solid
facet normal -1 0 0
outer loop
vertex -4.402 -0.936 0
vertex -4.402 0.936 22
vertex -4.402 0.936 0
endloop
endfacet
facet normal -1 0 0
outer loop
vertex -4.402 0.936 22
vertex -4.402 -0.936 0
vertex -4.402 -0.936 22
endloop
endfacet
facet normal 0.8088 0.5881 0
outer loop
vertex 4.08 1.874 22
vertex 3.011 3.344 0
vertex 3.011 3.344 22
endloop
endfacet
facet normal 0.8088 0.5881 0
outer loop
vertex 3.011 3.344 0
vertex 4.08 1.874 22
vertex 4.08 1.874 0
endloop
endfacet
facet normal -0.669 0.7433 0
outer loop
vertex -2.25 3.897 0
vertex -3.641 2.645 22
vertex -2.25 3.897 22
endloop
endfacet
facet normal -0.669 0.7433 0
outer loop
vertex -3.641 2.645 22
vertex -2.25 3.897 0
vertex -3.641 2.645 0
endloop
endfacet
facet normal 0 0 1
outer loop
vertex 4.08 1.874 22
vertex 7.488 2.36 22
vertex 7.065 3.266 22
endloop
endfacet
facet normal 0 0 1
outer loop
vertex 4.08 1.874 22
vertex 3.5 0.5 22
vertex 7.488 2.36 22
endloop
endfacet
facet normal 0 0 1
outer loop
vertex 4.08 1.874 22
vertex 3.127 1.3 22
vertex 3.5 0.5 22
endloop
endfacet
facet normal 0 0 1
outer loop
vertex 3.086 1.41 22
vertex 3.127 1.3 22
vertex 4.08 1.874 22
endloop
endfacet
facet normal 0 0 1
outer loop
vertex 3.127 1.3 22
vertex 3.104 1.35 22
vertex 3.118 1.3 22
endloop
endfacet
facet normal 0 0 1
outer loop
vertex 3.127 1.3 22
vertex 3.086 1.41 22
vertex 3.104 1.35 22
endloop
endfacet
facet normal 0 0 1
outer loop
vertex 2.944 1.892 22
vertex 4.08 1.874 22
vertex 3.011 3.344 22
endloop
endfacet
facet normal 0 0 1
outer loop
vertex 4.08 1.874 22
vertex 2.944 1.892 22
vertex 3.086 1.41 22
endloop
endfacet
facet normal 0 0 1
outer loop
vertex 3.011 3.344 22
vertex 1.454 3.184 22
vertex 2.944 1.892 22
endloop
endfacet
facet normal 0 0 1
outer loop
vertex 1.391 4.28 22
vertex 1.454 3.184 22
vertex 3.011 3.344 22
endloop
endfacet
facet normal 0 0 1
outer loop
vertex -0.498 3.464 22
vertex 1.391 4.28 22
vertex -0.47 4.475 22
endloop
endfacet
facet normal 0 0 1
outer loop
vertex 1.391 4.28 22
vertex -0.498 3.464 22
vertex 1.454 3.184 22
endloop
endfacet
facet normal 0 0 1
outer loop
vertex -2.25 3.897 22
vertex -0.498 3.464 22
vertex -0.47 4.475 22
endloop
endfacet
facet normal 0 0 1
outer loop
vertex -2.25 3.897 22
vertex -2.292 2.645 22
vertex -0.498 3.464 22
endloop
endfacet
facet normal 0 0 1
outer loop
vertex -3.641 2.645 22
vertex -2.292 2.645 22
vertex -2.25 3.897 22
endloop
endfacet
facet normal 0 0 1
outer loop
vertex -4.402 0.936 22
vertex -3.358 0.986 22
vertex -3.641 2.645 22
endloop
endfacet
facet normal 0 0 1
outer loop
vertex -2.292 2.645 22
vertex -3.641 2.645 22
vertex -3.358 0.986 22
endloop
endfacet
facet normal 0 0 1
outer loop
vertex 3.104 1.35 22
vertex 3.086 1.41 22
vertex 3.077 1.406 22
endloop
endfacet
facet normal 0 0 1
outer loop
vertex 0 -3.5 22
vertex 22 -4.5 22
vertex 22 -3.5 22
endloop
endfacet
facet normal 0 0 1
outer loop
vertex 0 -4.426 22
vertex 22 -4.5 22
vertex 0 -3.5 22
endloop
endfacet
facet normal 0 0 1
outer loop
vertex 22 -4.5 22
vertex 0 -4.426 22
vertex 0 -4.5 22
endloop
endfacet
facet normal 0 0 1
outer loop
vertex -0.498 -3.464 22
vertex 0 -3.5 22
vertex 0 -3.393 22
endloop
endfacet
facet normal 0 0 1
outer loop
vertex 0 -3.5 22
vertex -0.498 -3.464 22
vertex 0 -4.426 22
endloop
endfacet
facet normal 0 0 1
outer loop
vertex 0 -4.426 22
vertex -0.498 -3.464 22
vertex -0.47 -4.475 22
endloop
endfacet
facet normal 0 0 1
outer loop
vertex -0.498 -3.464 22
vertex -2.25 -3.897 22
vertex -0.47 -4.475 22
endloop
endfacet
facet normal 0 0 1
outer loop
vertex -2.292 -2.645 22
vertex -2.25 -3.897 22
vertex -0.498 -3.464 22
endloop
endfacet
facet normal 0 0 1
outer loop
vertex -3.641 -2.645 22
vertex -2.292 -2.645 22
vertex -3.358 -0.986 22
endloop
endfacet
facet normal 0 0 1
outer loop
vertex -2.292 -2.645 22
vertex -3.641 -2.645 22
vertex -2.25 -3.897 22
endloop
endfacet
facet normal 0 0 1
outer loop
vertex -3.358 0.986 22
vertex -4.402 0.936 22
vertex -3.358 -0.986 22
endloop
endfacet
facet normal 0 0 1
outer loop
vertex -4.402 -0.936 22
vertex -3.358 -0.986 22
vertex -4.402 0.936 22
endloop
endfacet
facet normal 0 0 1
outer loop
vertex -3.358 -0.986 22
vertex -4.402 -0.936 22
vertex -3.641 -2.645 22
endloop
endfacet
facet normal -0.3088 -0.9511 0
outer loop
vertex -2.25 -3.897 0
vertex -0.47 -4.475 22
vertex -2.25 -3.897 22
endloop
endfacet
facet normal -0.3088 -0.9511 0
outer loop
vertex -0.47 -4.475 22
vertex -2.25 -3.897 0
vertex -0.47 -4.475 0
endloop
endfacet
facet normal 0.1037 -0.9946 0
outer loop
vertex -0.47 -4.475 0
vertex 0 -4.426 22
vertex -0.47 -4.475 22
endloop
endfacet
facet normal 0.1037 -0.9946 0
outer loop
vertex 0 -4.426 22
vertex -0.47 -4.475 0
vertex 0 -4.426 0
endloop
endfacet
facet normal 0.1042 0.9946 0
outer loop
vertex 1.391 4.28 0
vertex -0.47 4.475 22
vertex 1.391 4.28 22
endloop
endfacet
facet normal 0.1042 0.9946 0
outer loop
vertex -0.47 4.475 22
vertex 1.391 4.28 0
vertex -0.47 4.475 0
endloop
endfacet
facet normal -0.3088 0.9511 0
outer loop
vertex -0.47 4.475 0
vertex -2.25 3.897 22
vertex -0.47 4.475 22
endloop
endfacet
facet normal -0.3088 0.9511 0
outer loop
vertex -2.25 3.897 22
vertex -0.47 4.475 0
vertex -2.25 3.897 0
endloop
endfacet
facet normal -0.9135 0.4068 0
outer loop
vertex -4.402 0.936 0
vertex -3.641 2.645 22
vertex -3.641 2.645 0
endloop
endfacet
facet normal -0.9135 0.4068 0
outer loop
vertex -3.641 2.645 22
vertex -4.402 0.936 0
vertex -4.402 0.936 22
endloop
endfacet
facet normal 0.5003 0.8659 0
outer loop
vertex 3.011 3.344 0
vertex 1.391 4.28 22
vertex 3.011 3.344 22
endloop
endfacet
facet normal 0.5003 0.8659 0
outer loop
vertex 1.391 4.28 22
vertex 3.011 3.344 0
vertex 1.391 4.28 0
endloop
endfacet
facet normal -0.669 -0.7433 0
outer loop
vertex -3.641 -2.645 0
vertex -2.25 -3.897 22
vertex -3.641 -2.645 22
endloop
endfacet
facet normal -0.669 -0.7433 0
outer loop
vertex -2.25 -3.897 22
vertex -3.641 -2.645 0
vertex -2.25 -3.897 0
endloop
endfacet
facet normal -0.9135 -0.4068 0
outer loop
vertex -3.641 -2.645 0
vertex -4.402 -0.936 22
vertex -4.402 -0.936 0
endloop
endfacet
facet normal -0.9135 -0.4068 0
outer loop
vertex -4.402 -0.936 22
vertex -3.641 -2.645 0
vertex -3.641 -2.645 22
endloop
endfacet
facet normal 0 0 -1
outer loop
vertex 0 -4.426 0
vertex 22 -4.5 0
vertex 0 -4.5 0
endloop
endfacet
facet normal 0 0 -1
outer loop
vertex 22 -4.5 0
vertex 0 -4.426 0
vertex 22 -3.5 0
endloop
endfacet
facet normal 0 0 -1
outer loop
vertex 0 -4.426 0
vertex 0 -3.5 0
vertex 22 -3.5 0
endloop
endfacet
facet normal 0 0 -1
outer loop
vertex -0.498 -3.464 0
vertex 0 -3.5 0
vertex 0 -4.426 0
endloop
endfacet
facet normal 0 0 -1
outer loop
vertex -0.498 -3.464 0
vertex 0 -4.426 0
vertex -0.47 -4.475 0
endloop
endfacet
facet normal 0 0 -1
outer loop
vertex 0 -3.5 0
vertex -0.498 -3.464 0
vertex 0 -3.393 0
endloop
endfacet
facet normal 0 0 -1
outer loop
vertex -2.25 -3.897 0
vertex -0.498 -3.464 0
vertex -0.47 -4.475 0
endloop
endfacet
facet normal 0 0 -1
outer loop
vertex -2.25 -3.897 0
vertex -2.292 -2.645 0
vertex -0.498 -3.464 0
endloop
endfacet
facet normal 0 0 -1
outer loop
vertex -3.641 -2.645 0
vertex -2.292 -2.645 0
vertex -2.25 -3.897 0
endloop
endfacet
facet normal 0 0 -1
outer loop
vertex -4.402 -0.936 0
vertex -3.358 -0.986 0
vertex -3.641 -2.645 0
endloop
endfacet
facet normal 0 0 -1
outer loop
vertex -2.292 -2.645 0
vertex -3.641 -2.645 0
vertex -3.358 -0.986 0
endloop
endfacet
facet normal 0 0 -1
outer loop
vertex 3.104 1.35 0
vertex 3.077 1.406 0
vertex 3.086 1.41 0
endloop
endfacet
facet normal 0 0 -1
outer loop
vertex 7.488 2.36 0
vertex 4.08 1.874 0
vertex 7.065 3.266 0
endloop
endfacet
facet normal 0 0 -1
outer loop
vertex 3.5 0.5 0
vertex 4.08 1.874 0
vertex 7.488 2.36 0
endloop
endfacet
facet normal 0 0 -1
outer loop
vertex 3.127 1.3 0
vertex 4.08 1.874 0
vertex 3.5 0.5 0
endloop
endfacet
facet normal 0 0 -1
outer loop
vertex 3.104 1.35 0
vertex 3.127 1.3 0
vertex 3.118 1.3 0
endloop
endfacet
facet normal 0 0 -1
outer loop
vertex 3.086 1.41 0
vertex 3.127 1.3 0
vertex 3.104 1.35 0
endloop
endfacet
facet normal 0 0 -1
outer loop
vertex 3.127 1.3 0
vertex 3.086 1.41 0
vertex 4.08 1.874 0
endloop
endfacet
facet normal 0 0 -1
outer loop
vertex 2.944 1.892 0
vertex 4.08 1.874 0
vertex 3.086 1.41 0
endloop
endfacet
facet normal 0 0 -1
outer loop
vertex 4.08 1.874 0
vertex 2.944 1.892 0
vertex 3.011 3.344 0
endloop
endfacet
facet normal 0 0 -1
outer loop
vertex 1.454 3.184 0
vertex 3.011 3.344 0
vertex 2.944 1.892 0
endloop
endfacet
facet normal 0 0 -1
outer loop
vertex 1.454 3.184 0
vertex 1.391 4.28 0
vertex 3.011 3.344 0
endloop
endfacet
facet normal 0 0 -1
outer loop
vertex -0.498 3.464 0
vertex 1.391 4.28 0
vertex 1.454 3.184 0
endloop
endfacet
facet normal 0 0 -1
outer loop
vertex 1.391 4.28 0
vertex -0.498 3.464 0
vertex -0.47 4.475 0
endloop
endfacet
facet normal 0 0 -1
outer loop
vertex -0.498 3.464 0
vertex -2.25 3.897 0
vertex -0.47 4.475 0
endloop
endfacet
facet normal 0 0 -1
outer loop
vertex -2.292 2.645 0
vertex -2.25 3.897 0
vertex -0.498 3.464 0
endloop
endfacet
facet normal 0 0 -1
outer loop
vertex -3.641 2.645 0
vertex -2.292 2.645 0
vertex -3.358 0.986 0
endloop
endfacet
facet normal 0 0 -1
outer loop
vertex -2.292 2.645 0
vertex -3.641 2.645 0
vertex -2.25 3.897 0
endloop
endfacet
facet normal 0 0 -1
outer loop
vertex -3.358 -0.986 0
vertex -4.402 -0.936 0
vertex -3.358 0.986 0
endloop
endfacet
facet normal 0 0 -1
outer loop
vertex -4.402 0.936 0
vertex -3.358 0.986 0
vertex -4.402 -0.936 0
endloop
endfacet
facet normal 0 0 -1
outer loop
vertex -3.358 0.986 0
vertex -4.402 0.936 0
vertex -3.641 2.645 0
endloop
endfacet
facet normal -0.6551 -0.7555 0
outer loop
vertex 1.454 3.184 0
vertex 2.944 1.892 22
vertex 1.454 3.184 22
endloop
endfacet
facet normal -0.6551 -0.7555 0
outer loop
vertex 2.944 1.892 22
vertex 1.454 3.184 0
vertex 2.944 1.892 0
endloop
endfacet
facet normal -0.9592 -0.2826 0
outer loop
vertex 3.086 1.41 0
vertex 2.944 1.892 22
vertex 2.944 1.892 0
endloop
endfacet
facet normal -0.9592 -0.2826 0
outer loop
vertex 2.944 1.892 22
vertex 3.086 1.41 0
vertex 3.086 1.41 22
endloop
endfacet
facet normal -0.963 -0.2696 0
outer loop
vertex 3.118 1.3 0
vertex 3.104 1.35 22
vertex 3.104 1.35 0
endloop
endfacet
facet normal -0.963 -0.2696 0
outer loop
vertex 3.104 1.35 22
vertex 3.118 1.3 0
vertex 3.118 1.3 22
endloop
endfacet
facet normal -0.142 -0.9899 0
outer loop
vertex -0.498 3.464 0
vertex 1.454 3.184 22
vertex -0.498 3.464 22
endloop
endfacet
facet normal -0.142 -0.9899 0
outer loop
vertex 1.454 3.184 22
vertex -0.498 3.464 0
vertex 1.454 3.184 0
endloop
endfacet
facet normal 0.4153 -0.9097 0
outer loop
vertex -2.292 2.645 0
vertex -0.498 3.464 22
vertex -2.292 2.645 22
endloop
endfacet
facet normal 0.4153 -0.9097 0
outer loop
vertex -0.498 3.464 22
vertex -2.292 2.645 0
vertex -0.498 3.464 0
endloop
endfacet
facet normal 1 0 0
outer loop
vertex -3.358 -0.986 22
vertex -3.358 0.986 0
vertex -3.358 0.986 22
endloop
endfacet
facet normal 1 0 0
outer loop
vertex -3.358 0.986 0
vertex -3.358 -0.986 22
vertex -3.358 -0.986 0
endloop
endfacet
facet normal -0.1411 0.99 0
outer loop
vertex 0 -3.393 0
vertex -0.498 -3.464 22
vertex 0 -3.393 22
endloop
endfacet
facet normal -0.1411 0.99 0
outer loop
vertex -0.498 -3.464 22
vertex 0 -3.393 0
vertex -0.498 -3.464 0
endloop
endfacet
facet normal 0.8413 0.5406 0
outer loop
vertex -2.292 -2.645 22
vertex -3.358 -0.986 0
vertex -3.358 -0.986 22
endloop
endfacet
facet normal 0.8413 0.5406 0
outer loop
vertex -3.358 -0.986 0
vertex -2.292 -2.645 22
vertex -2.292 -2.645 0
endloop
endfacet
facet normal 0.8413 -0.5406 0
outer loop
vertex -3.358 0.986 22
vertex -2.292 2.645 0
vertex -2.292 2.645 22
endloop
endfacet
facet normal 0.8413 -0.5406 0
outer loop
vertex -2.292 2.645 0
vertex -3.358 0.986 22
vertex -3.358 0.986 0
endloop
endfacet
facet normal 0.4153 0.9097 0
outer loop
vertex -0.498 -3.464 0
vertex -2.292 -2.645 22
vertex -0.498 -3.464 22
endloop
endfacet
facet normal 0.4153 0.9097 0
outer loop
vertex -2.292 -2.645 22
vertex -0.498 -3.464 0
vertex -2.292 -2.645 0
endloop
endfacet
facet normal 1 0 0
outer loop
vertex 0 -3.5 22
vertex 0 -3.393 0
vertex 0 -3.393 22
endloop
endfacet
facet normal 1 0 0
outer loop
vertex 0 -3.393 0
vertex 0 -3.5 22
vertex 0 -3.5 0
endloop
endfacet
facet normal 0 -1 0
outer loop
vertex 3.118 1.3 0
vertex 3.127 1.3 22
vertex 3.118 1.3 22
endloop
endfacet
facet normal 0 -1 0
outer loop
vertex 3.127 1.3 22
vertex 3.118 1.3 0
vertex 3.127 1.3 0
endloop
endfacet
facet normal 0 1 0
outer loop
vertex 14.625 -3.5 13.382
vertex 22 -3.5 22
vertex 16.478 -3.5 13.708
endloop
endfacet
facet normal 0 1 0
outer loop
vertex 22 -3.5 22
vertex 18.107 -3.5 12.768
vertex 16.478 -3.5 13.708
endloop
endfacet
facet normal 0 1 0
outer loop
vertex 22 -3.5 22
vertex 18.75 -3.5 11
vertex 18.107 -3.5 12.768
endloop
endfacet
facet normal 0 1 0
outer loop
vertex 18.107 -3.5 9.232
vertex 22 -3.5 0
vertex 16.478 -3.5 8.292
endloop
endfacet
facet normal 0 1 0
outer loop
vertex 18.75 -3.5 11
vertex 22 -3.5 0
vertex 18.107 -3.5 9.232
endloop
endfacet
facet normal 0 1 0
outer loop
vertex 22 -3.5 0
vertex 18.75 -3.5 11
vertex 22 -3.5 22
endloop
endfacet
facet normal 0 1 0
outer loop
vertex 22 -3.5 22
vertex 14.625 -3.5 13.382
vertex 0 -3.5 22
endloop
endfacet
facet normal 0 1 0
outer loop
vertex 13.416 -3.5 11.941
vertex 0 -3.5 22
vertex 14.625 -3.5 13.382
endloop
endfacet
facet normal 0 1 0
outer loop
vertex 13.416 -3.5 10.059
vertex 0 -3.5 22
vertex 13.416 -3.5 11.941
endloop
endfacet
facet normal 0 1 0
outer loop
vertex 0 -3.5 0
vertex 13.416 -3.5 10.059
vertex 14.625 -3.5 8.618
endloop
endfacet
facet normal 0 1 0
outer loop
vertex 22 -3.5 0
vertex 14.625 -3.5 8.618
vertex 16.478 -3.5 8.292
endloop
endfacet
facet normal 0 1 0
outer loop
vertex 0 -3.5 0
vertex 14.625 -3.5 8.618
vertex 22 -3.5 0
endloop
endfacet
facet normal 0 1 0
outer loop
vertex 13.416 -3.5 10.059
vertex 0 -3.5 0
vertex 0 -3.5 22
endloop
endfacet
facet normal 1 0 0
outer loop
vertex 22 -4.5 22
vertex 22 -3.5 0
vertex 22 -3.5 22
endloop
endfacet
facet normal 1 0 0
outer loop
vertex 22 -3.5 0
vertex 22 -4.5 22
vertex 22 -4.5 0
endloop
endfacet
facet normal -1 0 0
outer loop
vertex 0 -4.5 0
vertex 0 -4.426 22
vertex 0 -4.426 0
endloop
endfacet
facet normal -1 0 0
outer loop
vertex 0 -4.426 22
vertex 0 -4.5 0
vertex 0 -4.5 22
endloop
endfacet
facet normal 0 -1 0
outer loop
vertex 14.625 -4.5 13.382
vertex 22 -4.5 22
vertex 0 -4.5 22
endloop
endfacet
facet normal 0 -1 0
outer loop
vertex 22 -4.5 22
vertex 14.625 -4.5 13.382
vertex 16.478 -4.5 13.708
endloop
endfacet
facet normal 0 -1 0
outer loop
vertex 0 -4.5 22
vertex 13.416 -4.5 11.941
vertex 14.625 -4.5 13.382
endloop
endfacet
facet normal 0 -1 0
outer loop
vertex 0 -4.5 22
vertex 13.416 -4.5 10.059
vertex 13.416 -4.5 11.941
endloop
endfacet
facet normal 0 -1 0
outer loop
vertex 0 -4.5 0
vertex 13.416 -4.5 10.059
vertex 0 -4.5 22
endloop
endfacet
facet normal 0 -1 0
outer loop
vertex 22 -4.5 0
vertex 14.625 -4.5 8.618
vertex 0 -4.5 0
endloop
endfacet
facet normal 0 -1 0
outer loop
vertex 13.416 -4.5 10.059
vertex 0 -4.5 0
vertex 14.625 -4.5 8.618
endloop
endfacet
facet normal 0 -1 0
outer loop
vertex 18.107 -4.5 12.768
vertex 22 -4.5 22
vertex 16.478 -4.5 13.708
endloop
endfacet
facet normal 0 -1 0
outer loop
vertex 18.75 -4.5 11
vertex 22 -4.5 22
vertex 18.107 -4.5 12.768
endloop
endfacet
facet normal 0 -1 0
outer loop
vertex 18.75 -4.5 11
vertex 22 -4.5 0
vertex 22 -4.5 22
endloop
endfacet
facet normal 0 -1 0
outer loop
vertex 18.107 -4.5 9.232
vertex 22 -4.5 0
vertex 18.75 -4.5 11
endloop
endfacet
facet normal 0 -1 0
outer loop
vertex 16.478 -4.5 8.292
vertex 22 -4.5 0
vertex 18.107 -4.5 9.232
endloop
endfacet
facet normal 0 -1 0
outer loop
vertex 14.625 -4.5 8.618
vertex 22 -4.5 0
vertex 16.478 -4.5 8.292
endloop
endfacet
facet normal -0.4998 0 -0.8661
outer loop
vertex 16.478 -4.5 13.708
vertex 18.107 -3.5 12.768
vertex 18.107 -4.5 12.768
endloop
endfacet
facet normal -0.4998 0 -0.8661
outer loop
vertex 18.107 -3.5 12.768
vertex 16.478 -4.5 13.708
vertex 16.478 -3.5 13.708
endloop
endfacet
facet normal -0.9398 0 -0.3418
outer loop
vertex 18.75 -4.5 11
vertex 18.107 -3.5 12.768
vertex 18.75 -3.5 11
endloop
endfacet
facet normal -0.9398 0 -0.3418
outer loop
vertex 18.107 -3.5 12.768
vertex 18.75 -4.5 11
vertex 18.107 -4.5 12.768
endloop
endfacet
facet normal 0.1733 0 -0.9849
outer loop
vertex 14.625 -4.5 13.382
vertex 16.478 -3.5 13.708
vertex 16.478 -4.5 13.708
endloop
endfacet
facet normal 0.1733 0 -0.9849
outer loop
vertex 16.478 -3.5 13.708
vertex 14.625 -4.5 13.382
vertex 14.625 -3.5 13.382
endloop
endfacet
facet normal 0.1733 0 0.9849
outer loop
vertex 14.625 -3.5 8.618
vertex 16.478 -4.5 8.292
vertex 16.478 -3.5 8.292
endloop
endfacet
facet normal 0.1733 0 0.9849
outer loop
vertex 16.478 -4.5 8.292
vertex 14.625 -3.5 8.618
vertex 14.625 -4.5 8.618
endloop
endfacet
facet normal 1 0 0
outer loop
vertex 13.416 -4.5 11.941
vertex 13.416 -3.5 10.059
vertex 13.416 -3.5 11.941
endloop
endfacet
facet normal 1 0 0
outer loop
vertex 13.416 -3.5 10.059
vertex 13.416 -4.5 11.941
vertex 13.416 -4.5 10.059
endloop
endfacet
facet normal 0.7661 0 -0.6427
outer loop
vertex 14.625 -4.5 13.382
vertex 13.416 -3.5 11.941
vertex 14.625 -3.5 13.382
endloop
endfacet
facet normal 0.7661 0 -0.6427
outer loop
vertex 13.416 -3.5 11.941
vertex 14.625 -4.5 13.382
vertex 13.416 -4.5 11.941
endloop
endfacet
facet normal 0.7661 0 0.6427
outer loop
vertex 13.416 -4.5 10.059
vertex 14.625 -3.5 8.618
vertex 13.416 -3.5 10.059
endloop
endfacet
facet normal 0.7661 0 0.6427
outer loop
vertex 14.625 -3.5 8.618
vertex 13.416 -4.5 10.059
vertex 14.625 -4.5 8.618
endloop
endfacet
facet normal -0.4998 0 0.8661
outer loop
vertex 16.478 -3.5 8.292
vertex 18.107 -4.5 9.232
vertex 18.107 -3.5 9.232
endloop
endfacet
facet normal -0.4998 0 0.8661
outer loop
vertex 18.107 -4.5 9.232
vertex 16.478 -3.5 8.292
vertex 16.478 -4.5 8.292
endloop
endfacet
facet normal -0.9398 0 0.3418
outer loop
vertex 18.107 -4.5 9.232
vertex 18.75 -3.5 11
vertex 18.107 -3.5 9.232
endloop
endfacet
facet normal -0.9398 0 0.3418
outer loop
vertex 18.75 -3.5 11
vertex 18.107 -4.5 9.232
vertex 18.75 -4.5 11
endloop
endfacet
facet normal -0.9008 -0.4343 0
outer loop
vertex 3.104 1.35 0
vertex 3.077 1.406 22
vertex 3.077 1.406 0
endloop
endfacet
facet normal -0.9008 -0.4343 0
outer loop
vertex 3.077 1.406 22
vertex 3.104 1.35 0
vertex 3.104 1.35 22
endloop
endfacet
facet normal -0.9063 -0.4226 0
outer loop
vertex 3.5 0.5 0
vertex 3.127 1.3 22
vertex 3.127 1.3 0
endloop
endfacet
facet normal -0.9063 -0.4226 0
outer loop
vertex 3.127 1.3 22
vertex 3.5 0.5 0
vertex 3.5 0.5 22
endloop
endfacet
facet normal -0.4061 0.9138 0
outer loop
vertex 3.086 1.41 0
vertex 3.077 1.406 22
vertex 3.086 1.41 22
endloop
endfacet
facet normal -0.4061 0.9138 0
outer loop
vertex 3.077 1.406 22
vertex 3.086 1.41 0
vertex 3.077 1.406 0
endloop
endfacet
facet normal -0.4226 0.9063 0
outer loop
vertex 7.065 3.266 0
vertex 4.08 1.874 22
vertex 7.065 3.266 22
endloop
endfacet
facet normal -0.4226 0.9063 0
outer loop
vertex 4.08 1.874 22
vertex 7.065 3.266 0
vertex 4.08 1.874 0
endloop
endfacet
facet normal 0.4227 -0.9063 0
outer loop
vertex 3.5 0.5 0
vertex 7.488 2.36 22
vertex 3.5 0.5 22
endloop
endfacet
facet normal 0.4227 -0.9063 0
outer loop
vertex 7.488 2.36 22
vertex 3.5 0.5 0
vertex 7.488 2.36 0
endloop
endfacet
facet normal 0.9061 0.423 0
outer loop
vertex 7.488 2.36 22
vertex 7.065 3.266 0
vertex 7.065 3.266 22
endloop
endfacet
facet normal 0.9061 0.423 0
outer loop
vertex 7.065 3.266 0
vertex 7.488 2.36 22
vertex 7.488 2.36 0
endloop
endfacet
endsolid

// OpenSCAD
module cable_holder(height) {
	union() {
		difference() {
			cylinder(d=9, h=height);
			translate([0, 0, -1]) cylinder(d=7, h=2*height);
			translate([0, -9/2+1, -1]) cube(size=[22, 4.8, 2*height]);
		}
		difference() {
			translate([0, -9/2, 0]) cube(size=[22, 1, height]);
			translate([16, 0, height/2]) rotate(a=[90, 0, 0]) cylinder(d=5.5, h=10);
		}
		translate([3.5, 0.5, 0]) rotate(a=[0, 0, 25]) cube(size=[4.4, 1, height]);
	}
}

cable_holder(22);
